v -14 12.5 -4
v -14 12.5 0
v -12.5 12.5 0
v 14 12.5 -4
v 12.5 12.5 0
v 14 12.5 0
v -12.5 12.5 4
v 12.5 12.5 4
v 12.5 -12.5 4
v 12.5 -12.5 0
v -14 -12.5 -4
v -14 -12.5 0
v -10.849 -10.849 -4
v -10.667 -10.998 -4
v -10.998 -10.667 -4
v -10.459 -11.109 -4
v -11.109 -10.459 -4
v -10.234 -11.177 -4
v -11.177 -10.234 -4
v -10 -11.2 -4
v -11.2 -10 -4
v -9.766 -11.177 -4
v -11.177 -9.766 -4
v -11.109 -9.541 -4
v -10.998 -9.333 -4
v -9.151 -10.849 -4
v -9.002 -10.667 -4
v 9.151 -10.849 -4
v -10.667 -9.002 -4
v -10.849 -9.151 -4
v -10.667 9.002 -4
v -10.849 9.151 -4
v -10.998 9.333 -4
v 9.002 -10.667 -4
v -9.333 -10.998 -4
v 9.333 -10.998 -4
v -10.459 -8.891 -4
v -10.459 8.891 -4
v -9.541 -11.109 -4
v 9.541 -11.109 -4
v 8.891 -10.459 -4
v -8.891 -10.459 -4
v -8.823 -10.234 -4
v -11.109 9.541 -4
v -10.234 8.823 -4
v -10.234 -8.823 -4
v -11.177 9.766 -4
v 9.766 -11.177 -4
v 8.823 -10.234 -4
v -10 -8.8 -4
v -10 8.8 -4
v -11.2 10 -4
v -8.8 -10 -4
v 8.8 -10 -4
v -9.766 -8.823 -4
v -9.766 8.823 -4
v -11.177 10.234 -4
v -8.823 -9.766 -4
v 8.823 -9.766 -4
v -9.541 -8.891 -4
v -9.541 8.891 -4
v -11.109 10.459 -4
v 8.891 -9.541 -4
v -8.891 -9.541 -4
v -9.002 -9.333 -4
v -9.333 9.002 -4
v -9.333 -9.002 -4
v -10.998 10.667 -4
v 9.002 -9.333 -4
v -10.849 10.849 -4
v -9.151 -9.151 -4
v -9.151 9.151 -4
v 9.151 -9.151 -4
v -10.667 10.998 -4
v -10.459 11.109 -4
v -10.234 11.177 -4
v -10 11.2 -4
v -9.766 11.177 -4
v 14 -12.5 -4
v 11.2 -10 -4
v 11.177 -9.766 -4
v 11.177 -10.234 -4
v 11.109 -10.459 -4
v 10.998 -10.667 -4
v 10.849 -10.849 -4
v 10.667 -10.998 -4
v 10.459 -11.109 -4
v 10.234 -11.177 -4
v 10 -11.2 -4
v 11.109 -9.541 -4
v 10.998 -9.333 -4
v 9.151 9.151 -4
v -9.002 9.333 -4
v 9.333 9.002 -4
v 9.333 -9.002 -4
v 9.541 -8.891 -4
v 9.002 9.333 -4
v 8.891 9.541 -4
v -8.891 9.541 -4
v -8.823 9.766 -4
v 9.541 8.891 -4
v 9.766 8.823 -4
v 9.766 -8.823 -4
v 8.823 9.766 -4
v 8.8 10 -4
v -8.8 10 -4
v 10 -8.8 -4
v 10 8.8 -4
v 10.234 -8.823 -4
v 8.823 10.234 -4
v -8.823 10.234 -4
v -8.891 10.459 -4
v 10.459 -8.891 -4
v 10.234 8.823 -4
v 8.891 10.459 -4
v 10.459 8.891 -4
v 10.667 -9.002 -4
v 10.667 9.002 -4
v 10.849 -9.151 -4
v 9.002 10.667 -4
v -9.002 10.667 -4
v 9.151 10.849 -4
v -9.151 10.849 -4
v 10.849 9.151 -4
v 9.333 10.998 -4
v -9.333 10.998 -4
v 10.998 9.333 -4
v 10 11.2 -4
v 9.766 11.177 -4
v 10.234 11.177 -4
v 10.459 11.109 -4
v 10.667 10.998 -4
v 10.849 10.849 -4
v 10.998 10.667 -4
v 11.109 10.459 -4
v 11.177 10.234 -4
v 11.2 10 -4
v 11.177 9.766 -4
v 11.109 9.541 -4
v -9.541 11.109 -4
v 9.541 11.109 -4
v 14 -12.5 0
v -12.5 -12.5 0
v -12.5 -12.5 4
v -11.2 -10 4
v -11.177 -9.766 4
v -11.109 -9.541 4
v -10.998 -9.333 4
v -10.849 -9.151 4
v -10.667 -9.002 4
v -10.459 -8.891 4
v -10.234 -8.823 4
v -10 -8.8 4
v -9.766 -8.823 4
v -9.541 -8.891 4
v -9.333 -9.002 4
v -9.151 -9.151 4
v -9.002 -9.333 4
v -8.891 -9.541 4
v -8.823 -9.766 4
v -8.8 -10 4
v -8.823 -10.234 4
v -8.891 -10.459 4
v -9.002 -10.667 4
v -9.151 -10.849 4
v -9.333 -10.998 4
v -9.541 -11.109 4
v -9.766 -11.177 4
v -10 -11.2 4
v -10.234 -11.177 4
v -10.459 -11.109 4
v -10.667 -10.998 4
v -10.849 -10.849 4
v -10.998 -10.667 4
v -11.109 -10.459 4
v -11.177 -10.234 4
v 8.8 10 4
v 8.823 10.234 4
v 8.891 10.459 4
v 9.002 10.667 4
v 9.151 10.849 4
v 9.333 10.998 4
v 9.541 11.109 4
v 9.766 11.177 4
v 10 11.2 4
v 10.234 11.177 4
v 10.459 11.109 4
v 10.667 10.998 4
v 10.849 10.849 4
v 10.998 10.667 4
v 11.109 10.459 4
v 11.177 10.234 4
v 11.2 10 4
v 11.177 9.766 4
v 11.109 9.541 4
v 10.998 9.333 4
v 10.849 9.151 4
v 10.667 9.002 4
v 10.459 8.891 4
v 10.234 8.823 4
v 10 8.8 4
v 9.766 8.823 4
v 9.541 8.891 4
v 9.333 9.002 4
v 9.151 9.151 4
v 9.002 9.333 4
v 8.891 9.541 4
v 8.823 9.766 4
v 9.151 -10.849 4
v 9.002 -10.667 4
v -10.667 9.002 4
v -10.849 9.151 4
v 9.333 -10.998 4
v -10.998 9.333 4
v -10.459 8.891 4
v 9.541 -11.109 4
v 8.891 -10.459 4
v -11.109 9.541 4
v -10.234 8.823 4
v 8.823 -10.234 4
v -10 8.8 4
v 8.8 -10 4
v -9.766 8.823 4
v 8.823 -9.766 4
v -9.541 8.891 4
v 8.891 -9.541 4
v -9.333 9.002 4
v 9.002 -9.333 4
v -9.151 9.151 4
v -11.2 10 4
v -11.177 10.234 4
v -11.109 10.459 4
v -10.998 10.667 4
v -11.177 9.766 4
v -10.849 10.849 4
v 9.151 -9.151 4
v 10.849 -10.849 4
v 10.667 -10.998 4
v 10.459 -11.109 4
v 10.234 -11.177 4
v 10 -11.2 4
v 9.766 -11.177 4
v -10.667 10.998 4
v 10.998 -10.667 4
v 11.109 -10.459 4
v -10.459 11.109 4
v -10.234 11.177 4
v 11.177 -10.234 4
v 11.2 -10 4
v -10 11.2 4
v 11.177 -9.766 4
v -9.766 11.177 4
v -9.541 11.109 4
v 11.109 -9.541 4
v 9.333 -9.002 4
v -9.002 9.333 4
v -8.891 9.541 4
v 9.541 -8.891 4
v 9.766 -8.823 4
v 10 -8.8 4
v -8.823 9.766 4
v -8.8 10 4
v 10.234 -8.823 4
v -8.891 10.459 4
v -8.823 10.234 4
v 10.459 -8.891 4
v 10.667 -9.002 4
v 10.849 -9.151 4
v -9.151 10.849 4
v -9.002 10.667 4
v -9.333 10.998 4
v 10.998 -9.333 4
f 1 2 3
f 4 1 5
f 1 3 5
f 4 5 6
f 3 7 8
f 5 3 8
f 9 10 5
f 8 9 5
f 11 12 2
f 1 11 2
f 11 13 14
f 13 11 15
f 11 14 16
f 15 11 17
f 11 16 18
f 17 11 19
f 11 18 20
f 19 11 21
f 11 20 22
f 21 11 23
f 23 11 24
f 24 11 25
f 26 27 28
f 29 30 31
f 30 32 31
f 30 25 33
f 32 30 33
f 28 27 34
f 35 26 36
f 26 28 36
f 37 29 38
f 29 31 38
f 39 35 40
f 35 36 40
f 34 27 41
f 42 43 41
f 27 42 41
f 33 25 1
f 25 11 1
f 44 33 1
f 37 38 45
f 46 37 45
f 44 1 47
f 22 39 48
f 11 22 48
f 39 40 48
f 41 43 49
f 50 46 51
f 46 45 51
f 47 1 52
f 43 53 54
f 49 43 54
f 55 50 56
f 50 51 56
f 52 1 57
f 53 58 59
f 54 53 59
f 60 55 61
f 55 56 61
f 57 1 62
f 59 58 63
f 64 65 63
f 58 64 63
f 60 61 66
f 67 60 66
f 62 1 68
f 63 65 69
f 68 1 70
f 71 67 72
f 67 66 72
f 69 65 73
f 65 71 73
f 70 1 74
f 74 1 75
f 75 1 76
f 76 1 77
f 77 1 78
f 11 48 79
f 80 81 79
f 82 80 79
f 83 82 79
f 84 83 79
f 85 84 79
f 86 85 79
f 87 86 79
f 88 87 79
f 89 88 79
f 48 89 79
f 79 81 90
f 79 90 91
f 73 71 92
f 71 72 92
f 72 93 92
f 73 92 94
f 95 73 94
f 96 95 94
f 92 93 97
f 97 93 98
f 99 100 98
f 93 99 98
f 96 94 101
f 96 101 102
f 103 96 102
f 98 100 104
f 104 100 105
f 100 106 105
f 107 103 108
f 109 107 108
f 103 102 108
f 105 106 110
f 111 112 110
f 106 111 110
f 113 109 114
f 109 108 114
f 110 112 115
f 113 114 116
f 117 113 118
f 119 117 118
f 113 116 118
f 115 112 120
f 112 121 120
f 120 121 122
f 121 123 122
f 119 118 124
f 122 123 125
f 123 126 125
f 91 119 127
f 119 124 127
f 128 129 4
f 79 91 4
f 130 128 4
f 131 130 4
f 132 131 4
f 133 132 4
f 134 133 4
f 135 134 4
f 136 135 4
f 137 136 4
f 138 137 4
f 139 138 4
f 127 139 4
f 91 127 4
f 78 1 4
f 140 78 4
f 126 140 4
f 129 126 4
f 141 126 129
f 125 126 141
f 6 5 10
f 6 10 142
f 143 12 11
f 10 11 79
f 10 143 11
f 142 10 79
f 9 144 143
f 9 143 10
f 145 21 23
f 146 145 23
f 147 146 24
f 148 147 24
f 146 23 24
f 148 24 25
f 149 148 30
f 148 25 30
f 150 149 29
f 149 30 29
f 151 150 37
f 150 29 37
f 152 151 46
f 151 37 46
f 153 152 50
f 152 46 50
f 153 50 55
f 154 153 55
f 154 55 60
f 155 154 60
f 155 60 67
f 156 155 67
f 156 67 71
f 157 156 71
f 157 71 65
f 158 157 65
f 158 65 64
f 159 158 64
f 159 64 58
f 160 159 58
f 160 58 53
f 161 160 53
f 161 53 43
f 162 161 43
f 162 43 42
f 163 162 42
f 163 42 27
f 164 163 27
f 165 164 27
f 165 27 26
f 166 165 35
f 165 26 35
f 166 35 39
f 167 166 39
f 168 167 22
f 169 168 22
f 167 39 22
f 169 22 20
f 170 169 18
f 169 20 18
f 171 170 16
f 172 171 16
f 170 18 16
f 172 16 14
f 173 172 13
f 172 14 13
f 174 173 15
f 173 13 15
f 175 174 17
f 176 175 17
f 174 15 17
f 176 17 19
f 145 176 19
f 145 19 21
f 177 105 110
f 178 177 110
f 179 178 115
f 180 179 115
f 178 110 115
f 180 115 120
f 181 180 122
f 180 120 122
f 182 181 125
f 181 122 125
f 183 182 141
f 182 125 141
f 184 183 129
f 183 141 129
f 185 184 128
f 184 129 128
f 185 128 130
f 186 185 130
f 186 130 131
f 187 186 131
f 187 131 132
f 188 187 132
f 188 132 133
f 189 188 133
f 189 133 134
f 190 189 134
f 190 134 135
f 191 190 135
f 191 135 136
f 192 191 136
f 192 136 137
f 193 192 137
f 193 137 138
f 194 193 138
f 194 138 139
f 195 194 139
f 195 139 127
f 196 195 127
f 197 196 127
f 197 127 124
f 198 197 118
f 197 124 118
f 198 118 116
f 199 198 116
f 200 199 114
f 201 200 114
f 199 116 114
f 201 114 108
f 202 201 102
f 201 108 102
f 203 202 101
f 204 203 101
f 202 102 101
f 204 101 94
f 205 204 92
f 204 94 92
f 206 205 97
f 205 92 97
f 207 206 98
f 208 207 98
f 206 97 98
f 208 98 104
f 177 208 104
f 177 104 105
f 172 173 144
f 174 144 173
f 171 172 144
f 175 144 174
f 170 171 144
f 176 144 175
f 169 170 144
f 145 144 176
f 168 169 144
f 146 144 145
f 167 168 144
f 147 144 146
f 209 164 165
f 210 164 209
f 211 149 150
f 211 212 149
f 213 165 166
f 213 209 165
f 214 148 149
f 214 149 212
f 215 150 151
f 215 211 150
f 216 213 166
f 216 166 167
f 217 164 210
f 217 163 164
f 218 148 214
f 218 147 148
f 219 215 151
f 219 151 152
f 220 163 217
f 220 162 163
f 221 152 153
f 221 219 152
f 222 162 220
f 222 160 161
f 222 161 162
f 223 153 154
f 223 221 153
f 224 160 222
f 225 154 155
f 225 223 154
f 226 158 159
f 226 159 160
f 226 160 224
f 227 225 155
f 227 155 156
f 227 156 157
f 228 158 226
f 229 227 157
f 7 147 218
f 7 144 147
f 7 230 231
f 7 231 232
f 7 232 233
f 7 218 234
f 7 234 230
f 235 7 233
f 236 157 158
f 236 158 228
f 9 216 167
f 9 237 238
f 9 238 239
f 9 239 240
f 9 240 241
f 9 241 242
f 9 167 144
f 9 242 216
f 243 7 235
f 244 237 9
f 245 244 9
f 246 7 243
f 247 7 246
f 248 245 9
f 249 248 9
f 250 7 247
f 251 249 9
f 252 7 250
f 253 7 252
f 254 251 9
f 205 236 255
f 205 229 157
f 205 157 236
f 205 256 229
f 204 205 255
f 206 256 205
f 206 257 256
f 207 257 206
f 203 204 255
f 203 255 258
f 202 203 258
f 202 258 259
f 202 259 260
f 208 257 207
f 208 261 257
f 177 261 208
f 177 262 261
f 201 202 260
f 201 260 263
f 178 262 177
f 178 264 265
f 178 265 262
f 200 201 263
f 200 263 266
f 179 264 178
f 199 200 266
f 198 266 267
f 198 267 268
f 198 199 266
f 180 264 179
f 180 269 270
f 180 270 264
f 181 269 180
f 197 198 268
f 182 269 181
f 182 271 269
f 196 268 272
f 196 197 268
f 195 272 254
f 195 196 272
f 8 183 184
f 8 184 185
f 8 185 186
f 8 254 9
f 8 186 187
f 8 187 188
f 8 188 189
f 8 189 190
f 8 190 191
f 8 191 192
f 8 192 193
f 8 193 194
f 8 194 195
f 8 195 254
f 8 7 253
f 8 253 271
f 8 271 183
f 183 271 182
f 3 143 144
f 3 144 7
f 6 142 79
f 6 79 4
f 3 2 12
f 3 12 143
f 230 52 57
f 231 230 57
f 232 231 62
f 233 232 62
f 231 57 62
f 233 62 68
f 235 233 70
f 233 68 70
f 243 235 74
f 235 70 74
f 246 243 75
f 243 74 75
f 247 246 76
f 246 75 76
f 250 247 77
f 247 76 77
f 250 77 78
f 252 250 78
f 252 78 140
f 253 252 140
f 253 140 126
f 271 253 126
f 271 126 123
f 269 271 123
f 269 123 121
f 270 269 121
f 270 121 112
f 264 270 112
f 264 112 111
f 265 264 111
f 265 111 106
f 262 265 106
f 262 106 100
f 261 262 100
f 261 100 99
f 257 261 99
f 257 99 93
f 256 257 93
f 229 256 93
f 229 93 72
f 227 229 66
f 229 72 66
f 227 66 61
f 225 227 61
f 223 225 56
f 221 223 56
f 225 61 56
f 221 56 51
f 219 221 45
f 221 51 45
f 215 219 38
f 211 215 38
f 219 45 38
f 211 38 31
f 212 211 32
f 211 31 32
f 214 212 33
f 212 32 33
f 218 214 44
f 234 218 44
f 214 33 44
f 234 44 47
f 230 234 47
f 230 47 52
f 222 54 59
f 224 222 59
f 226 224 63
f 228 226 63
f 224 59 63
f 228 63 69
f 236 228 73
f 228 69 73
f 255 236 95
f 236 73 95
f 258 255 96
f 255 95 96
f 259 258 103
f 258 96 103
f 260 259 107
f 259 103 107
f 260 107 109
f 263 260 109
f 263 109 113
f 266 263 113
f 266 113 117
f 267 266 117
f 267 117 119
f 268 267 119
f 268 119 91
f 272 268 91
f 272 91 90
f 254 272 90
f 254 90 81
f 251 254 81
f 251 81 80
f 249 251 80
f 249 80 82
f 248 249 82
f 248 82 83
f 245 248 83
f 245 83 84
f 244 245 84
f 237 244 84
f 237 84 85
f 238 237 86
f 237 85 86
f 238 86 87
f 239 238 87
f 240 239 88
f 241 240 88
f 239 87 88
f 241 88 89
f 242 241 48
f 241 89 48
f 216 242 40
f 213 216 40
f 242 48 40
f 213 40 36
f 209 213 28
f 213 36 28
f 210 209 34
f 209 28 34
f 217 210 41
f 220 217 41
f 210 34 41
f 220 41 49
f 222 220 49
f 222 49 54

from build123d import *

# Parameters (mm, degrees)
F0_W     = 28
F0_H     = 25
F1_DEPTH = 4
F2_W     = 25
F2_H     = 25
F3_DEPTH = 4
F5_D     = 2.4


with BuildPart() as f1:
    # F0 (on Top) → F1 (new body)
    with BuildSketch(Plane.XY):
        Rectangle(F0_W, F0_H)
    extrude(amount=-F1_DEPTH)

    # F2 (on Top) → F3 (join)
    with BuildSketch(Plane.XY):
        Rectangle(F2_W, F2_H)
    extrude(amount=F3_DEPTH)

    # F5 (through all)
    with Locations(Plane.XY.offset(4)):
        with Locations((-10, 10), (10, 10), (10, -10), (-10, -10)):
            Hole(F5_D / 2)


solid = f1.part
